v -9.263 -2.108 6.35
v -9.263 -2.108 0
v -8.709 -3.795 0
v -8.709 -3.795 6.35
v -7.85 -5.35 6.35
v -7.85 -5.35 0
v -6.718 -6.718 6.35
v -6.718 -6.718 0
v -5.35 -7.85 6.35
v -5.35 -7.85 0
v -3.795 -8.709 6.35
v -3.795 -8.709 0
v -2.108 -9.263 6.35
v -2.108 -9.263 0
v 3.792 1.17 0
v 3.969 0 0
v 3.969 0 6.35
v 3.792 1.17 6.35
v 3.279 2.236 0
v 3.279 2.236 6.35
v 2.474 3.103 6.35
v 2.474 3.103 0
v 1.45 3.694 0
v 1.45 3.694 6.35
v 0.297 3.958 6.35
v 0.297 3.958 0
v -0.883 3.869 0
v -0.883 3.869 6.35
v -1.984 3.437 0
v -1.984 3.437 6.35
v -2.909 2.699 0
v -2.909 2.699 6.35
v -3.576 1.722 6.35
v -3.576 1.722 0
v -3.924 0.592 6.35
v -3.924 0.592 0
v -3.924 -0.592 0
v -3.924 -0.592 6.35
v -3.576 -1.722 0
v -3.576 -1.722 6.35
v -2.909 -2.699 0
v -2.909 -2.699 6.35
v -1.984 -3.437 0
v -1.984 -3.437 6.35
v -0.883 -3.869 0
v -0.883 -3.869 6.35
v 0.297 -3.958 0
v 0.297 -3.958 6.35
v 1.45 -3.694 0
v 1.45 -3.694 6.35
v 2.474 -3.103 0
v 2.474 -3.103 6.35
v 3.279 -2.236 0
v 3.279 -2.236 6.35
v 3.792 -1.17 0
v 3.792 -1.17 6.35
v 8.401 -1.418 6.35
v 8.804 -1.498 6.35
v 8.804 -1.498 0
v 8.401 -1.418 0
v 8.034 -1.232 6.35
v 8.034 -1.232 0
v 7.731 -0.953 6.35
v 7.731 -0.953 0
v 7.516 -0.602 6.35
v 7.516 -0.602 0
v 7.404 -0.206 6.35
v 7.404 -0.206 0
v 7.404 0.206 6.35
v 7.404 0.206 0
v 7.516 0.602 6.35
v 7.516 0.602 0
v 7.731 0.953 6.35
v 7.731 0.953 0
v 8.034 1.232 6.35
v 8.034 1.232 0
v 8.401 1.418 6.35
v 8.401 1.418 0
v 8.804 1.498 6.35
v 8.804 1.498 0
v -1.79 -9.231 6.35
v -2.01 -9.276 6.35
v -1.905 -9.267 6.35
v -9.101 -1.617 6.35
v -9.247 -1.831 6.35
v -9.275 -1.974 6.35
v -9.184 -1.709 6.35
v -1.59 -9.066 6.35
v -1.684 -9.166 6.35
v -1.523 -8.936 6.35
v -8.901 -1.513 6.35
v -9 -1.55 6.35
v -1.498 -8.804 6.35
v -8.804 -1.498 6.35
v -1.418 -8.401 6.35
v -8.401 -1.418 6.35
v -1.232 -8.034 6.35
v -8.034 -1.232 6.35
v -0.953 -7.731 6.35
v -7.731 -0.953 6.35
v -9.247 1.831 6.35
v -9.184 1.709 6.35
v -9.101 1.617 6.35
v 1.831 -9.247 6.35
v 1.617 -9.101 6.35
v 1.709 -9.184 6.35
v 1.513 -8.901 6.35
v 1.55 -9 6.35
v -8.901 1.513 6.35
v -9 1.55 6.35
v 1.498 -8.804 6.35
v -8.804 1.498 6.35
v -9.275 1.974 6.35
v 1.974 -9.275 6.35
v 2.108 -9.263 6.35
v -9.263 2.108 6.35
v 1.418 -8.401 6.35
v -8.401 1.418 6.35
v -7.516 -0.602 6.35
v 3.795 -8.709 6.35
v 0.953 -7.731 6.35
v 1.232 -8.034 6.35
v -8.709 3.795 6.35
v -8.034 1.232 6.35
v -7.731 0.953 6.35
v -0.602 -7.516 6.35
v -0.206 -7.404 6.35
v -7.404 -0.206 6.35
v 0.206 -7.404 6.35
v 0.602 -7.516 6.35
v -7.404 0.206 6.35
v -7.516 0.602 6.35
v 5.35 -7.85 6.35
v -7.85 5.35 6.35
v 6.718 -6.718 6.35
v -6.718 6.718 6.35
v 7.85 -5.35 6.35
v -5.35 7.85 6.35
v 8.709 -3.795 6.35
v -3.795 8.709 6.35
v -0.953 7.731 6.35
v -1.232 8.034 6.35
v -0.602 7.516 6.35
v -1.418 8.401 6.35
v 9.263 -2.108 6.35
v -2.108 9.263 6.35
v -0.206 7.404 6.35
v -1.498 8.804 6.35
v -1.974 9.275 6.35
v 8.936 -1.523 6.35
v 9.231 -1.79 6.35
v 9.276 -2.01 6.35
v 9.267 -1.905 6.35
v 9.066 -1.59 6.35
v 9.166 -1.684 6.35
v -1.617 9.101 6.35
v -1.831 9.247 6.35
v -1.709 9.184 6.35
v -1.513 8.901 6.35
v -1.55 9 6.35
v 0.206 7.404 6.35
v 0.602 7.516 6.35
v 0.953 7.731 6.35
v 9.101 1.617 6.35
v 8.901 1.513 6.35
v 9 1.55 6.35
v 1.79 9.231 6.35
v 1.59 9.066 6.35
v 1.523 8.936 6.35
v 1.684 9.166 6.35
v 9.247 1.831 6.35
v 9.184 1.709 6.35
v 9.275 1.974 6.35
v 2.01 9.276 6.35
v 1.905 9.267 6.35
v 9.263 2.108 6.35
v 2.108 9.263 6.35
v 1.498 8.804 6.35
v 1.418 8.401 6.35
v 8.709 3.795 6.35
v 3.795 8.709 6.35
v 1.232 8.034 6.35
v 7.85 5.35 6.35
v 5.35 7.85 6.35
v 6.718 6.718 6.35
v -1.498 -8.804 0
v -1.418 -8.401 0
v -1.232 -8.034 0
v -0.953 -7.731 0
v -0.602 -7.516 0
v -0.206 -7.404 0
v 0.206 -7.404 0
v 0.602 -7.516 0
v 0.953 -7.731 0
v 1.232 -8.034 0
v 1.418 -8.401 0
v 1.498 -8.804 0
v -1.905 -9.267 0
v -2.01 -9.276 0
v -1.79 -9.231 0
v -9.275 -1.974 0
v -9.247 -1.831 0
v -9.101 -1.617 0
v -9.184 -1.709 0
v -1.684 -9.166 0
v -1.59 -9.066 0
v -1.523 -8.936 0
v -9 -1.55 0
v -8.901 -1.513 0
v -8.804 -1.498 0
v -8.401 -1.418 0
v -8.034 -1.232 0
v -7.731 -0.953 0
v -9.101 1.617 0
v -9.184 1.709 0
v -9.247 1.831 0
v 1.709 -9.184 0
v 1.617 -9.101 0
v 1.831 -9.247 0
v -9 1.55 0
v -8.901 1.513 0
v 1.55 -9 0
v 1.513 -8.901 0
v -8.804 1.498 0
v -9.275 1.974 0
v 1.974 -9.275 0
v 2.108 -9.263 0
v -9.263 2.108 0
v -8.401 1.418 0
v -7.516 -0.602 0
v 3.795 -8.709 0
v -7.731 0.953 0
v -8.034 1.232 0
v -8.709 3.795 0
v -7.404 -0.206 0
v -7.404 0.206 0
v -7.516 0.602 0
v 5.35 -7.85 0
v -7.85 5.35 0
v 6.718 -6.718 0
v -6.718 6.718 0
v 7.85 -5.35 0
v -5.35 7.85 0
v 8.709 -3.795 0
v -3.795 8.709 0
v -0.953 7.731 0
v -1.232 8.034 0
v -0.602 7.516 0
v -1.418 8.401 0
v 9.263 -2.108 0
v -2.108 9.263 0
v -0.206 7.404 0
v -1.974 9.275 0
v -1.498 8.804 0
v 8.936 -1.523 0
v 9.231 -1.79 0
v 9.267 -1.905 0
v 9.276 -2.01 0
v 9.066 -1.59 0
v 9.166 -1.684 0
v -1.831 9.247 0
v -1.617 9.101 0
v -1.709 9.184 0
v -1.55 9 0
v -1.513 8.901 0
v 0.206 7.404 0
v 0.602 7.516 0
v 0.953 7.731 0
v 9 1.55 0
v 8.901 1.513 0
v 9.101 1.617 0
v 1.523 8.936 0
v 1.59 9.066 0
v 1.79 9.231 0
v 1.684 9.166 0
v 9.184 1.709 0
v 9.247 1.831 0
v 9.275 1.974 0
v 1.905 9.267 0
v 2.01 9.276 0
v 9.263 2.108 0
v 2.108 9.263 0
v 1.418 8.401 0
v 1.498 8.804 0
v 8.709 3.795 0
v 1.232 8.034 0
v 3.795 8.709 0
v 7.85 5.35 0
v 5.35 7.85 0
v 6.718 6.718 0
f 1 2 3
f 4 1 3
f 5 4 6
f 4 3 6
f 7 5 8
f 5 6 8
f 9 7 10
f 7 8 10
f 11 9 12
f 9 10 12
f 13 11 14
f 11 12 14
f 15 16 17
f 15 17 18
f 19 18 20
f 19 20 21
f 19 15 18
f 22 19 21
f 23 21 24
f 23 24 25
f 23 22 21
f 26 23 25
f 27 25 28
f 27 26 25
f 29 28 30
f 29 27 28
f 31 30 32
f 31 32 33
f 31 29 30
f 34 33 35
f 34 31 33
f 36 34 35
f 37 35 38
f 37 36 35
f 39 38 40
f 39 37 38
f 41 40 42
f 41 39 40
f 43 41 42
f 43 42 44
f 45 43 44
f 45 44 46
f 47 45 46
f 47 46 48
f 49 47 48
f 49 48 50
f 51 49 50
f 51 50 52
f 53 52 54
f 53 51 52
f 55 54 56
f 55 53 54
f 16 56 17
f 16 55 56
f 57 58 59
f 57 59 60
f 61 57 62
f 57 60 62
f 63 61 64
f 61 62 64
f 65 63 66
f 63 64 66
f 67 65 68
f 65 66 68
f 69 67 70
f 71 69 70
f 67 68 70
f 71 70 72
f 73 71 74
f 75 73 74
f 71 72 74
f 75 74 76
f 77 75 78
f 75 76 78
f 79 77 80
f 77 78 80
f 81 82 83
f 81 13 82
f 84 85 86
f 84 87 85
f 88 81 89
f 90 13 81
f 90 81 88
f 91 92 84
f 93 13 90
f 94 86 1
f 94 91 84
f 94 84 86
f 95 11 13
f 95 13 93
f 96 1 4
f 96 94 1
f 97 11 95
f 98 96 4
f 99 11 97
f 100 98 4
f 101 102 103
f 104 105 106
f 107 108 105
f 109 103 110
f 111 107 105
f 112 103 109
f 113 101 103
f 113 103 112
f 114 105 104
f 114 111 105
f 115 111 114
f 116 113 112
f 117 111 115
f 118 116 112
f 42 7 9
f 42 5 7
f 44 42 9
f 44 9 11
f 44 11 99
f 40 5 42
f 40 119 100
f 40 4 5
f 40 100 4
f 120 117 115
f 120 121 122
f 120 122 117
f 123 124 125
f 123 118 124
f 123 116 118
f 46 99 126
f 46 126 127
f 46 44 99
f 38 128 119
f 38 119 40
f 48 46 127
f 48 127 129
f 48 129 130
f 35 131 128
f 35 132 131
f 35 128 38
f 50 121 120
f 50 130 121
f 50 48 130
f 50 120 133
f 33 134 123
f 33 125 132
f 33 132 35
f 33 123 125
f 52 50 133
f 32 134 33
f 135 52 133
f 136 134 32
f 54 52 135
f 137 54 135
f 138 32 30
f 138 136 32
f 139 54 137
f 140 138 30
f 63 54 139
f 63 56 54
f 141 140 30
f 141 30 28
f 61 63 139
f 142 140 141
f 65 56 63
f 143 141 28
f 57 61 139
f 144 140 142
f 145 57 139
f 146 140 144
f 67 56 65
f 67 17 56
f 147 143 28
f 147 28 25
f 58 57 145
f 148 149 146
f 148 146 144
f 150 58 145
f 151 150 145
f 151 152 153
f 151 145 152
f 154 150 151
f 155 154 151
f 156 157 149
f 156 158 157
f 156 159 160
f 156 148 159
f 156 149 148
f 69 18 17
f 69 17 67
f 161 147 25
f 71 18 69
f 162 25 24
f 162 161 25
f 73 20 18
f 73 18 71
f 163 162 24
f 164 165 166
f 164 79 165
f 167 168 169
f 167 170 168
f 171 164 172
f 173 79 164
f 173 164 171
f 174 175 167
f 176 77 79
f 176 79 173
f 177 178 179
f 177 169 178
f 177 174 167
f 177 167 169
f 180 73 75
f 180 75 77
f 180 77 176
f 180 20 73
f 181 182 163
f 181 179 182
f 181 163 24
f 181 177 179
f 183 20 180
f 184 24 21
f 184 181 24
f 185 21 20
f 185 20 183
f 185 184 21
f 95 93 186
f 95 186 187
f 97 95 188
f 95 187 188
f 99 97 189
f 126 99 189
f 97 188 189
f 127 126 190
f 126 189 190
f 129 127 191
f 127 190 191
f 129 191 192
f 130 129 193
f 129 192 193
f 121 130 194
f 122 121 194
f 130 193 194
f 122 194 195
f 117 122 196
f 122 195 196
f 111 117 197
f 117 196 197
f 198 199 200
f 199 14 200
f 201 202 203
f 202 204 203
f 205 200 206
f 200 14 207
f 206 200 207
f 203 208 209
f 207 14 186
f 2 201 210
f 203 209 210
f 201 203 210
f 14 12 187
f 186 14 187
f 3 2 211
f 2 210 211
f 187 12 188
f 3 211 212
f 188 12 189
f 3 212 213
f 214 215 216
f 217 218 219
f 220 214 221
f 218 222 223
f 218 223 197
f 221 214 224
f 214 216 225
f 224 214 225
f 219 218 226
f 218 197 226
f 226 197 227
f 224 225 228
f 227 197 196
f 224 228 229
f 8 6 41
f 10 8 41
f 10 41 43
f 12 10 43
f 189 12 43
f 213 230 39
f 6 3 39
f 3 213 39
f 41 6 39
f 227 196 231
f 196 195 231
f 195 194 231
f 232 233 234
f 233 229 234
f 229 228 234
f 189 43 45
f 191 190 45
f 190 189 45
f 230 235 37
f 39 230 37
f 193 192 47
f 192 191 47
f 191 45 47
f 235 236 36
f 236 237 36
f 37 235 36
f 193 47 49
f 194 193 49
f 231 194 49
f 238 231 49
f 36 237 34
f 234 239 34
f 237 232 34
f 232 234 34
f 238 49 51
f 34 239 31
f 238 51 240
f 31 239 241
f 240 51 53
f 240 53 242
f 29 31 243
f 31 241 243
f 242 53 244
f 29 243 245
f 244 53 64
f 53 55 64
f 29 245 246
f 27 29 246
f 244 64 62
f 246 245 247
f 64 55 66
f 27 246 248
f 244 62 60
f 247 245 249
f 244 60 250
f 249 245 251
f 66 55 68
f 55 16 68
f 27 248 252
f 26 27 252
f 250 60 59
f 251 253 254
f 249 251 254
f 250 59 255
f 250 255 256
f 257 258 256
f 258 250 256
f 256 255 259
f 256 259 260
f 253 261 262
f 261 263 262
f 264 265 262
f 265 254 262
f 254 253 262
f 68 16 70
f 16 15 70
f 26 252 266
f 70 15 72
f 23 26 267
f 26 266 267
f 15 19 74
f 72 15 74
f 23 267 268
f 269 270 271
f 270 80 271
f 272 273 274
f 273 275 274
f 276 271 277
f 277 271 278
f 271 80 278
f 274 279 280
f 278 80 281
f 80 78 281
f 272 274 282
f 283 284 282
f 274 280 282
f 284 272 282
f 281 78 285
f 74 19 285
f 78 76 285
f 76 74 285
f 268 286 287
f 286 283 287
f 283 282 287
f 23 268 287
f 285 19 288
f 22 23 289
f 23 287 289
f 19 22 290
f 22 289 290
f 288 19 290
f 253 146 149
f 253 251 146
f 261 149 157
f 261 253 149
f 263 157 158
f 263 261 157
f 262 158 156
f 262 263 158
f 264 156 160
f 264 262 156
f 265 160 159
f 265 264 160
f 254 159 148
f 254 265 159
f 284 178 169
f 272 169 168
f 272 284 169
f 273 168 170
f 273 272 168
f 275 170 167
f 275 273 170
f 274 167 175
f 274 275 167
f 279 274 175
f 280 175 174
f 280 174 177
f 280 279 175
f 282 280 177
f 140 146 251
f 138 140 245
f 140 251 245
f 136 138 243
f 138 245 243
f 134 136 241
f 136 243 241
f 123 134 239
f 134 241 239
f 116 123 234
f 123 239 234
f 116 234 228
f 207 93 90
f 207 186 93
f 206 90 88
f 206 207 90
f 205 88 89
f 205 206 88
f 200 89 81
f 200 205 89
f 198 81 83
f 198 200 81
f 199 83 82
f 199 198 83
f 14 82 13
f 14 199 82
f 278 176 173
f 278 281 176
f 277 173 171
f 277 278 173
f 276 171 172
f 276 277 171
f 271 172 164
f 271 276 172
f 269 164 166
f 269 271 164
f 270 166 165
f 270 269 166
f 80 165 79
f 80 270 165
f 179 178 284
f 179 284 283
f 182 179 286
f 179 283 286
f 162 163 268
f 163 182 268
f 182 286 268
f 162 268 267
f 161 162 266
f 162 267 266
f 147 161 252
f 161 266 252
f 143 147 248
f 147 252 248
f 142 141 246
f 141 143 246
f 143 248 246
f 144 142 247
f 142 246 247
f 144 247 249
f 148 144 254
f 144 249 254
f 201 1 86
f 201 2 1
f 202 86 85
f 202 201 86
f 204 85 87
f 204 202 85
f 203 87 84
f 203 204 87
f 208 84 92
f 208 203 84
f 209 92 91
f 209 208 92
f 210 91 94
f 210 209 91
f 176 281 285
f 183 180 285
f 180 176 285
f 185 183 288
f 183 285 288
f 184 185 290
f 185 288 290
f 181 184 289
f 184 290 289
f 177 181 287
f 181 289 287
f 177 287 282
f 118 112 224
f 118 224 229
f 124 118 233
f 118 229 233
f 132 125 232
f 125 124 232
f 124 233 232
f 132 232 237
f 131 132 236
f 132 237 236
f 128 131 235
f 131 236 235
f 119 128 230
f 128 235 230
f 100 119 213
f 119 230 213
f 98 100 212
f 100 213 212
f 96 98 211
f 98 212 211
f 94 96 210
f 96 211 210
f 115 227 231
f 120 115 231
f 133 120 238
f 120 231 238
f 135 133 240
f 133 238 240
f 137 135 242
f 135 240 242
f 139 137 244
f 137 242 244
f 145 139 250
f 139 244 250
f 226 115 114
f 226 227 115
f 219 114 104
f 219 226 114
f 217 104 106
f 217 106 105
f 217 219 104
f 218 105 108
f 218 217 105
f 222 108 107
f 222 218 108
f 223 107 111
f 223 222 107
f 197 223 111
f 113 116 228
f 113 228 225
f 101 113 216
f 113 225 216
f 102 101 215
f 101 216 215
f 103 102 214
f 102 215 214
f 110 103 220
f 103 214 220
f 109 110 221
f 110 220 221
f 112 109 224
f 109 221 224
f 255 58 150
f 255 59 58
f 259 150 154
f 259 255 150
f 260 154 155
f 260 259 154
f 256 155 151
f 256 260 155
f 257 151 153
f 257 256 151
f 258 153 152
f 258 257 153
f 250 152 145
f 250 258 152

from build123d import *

# Parameters (mm, degrees)
SKETCH1_R             = 9.5
SKETCH1_R_2           = 3.96875
BOSS_EXTRUDE1_DEPTH   = 6.35
F_3_0MM_DOWEL_HOLE1_D = 3
CIRPATTERN1_COUNT     = 4
FILLET1_R             = 0.5


with BuildPart() as part:
    # Sketch1 → Boss-Extrude1 (new body)
    with BuildSketch(Plane.XY):
        Circle(SKETCH1_R)
        Circle(SKETCH1_R_2, mode=Mode.SUBTRACT)
    extrude(amount=BOSS_EXTRUDE1_DEPTH)

    # Ø3.0mm Dowel Hole1 (through all)
    with Locations(Plane.XY.offset(6.35)):
        with Locations((0, 8.89)):
            f_3_0mm_dowel_hole1 = Hole(F_3_0MM_DOWEL_HOLE1_D / 2)

    # CirPattern1: Ø3.0mm Dowel Hole1 ×4 about axis
    cirpattern1_axis = Axis((0, 0, 0), (0, 0, 1))
    for i in range(1, CIRPATTERN1_COUNT):
        add(f_3_0mm_dowel_hole1.rotate(cirpattern1_axis, i * 360 / CIRPATTERN1_COUNT), mode=Mode.SUBTRACT)

    # Fillet1
    fillet1_edges = [part.edges().sort_by_distance(p)[0] for p in [
        (-1.412656886, 9.394381327, 3.175),
        (1.412656886, 9.394381327, 3.175),
        (-9.394381327, -1.412656886, 3.175),
        (-9.394381327, 1.412656886, 3.175),
        (1.412656886, -9.394381327, 3.175),
        (-1.412656886, -9.394381327, 3.175),
        (9.394381327, 1.412656886, 3.175),
        (9.394381327, -1.412656886, 3.175),
    ]]
    fillet(fillet1_edges, radius=FILLET1_R)


solid = part.part
